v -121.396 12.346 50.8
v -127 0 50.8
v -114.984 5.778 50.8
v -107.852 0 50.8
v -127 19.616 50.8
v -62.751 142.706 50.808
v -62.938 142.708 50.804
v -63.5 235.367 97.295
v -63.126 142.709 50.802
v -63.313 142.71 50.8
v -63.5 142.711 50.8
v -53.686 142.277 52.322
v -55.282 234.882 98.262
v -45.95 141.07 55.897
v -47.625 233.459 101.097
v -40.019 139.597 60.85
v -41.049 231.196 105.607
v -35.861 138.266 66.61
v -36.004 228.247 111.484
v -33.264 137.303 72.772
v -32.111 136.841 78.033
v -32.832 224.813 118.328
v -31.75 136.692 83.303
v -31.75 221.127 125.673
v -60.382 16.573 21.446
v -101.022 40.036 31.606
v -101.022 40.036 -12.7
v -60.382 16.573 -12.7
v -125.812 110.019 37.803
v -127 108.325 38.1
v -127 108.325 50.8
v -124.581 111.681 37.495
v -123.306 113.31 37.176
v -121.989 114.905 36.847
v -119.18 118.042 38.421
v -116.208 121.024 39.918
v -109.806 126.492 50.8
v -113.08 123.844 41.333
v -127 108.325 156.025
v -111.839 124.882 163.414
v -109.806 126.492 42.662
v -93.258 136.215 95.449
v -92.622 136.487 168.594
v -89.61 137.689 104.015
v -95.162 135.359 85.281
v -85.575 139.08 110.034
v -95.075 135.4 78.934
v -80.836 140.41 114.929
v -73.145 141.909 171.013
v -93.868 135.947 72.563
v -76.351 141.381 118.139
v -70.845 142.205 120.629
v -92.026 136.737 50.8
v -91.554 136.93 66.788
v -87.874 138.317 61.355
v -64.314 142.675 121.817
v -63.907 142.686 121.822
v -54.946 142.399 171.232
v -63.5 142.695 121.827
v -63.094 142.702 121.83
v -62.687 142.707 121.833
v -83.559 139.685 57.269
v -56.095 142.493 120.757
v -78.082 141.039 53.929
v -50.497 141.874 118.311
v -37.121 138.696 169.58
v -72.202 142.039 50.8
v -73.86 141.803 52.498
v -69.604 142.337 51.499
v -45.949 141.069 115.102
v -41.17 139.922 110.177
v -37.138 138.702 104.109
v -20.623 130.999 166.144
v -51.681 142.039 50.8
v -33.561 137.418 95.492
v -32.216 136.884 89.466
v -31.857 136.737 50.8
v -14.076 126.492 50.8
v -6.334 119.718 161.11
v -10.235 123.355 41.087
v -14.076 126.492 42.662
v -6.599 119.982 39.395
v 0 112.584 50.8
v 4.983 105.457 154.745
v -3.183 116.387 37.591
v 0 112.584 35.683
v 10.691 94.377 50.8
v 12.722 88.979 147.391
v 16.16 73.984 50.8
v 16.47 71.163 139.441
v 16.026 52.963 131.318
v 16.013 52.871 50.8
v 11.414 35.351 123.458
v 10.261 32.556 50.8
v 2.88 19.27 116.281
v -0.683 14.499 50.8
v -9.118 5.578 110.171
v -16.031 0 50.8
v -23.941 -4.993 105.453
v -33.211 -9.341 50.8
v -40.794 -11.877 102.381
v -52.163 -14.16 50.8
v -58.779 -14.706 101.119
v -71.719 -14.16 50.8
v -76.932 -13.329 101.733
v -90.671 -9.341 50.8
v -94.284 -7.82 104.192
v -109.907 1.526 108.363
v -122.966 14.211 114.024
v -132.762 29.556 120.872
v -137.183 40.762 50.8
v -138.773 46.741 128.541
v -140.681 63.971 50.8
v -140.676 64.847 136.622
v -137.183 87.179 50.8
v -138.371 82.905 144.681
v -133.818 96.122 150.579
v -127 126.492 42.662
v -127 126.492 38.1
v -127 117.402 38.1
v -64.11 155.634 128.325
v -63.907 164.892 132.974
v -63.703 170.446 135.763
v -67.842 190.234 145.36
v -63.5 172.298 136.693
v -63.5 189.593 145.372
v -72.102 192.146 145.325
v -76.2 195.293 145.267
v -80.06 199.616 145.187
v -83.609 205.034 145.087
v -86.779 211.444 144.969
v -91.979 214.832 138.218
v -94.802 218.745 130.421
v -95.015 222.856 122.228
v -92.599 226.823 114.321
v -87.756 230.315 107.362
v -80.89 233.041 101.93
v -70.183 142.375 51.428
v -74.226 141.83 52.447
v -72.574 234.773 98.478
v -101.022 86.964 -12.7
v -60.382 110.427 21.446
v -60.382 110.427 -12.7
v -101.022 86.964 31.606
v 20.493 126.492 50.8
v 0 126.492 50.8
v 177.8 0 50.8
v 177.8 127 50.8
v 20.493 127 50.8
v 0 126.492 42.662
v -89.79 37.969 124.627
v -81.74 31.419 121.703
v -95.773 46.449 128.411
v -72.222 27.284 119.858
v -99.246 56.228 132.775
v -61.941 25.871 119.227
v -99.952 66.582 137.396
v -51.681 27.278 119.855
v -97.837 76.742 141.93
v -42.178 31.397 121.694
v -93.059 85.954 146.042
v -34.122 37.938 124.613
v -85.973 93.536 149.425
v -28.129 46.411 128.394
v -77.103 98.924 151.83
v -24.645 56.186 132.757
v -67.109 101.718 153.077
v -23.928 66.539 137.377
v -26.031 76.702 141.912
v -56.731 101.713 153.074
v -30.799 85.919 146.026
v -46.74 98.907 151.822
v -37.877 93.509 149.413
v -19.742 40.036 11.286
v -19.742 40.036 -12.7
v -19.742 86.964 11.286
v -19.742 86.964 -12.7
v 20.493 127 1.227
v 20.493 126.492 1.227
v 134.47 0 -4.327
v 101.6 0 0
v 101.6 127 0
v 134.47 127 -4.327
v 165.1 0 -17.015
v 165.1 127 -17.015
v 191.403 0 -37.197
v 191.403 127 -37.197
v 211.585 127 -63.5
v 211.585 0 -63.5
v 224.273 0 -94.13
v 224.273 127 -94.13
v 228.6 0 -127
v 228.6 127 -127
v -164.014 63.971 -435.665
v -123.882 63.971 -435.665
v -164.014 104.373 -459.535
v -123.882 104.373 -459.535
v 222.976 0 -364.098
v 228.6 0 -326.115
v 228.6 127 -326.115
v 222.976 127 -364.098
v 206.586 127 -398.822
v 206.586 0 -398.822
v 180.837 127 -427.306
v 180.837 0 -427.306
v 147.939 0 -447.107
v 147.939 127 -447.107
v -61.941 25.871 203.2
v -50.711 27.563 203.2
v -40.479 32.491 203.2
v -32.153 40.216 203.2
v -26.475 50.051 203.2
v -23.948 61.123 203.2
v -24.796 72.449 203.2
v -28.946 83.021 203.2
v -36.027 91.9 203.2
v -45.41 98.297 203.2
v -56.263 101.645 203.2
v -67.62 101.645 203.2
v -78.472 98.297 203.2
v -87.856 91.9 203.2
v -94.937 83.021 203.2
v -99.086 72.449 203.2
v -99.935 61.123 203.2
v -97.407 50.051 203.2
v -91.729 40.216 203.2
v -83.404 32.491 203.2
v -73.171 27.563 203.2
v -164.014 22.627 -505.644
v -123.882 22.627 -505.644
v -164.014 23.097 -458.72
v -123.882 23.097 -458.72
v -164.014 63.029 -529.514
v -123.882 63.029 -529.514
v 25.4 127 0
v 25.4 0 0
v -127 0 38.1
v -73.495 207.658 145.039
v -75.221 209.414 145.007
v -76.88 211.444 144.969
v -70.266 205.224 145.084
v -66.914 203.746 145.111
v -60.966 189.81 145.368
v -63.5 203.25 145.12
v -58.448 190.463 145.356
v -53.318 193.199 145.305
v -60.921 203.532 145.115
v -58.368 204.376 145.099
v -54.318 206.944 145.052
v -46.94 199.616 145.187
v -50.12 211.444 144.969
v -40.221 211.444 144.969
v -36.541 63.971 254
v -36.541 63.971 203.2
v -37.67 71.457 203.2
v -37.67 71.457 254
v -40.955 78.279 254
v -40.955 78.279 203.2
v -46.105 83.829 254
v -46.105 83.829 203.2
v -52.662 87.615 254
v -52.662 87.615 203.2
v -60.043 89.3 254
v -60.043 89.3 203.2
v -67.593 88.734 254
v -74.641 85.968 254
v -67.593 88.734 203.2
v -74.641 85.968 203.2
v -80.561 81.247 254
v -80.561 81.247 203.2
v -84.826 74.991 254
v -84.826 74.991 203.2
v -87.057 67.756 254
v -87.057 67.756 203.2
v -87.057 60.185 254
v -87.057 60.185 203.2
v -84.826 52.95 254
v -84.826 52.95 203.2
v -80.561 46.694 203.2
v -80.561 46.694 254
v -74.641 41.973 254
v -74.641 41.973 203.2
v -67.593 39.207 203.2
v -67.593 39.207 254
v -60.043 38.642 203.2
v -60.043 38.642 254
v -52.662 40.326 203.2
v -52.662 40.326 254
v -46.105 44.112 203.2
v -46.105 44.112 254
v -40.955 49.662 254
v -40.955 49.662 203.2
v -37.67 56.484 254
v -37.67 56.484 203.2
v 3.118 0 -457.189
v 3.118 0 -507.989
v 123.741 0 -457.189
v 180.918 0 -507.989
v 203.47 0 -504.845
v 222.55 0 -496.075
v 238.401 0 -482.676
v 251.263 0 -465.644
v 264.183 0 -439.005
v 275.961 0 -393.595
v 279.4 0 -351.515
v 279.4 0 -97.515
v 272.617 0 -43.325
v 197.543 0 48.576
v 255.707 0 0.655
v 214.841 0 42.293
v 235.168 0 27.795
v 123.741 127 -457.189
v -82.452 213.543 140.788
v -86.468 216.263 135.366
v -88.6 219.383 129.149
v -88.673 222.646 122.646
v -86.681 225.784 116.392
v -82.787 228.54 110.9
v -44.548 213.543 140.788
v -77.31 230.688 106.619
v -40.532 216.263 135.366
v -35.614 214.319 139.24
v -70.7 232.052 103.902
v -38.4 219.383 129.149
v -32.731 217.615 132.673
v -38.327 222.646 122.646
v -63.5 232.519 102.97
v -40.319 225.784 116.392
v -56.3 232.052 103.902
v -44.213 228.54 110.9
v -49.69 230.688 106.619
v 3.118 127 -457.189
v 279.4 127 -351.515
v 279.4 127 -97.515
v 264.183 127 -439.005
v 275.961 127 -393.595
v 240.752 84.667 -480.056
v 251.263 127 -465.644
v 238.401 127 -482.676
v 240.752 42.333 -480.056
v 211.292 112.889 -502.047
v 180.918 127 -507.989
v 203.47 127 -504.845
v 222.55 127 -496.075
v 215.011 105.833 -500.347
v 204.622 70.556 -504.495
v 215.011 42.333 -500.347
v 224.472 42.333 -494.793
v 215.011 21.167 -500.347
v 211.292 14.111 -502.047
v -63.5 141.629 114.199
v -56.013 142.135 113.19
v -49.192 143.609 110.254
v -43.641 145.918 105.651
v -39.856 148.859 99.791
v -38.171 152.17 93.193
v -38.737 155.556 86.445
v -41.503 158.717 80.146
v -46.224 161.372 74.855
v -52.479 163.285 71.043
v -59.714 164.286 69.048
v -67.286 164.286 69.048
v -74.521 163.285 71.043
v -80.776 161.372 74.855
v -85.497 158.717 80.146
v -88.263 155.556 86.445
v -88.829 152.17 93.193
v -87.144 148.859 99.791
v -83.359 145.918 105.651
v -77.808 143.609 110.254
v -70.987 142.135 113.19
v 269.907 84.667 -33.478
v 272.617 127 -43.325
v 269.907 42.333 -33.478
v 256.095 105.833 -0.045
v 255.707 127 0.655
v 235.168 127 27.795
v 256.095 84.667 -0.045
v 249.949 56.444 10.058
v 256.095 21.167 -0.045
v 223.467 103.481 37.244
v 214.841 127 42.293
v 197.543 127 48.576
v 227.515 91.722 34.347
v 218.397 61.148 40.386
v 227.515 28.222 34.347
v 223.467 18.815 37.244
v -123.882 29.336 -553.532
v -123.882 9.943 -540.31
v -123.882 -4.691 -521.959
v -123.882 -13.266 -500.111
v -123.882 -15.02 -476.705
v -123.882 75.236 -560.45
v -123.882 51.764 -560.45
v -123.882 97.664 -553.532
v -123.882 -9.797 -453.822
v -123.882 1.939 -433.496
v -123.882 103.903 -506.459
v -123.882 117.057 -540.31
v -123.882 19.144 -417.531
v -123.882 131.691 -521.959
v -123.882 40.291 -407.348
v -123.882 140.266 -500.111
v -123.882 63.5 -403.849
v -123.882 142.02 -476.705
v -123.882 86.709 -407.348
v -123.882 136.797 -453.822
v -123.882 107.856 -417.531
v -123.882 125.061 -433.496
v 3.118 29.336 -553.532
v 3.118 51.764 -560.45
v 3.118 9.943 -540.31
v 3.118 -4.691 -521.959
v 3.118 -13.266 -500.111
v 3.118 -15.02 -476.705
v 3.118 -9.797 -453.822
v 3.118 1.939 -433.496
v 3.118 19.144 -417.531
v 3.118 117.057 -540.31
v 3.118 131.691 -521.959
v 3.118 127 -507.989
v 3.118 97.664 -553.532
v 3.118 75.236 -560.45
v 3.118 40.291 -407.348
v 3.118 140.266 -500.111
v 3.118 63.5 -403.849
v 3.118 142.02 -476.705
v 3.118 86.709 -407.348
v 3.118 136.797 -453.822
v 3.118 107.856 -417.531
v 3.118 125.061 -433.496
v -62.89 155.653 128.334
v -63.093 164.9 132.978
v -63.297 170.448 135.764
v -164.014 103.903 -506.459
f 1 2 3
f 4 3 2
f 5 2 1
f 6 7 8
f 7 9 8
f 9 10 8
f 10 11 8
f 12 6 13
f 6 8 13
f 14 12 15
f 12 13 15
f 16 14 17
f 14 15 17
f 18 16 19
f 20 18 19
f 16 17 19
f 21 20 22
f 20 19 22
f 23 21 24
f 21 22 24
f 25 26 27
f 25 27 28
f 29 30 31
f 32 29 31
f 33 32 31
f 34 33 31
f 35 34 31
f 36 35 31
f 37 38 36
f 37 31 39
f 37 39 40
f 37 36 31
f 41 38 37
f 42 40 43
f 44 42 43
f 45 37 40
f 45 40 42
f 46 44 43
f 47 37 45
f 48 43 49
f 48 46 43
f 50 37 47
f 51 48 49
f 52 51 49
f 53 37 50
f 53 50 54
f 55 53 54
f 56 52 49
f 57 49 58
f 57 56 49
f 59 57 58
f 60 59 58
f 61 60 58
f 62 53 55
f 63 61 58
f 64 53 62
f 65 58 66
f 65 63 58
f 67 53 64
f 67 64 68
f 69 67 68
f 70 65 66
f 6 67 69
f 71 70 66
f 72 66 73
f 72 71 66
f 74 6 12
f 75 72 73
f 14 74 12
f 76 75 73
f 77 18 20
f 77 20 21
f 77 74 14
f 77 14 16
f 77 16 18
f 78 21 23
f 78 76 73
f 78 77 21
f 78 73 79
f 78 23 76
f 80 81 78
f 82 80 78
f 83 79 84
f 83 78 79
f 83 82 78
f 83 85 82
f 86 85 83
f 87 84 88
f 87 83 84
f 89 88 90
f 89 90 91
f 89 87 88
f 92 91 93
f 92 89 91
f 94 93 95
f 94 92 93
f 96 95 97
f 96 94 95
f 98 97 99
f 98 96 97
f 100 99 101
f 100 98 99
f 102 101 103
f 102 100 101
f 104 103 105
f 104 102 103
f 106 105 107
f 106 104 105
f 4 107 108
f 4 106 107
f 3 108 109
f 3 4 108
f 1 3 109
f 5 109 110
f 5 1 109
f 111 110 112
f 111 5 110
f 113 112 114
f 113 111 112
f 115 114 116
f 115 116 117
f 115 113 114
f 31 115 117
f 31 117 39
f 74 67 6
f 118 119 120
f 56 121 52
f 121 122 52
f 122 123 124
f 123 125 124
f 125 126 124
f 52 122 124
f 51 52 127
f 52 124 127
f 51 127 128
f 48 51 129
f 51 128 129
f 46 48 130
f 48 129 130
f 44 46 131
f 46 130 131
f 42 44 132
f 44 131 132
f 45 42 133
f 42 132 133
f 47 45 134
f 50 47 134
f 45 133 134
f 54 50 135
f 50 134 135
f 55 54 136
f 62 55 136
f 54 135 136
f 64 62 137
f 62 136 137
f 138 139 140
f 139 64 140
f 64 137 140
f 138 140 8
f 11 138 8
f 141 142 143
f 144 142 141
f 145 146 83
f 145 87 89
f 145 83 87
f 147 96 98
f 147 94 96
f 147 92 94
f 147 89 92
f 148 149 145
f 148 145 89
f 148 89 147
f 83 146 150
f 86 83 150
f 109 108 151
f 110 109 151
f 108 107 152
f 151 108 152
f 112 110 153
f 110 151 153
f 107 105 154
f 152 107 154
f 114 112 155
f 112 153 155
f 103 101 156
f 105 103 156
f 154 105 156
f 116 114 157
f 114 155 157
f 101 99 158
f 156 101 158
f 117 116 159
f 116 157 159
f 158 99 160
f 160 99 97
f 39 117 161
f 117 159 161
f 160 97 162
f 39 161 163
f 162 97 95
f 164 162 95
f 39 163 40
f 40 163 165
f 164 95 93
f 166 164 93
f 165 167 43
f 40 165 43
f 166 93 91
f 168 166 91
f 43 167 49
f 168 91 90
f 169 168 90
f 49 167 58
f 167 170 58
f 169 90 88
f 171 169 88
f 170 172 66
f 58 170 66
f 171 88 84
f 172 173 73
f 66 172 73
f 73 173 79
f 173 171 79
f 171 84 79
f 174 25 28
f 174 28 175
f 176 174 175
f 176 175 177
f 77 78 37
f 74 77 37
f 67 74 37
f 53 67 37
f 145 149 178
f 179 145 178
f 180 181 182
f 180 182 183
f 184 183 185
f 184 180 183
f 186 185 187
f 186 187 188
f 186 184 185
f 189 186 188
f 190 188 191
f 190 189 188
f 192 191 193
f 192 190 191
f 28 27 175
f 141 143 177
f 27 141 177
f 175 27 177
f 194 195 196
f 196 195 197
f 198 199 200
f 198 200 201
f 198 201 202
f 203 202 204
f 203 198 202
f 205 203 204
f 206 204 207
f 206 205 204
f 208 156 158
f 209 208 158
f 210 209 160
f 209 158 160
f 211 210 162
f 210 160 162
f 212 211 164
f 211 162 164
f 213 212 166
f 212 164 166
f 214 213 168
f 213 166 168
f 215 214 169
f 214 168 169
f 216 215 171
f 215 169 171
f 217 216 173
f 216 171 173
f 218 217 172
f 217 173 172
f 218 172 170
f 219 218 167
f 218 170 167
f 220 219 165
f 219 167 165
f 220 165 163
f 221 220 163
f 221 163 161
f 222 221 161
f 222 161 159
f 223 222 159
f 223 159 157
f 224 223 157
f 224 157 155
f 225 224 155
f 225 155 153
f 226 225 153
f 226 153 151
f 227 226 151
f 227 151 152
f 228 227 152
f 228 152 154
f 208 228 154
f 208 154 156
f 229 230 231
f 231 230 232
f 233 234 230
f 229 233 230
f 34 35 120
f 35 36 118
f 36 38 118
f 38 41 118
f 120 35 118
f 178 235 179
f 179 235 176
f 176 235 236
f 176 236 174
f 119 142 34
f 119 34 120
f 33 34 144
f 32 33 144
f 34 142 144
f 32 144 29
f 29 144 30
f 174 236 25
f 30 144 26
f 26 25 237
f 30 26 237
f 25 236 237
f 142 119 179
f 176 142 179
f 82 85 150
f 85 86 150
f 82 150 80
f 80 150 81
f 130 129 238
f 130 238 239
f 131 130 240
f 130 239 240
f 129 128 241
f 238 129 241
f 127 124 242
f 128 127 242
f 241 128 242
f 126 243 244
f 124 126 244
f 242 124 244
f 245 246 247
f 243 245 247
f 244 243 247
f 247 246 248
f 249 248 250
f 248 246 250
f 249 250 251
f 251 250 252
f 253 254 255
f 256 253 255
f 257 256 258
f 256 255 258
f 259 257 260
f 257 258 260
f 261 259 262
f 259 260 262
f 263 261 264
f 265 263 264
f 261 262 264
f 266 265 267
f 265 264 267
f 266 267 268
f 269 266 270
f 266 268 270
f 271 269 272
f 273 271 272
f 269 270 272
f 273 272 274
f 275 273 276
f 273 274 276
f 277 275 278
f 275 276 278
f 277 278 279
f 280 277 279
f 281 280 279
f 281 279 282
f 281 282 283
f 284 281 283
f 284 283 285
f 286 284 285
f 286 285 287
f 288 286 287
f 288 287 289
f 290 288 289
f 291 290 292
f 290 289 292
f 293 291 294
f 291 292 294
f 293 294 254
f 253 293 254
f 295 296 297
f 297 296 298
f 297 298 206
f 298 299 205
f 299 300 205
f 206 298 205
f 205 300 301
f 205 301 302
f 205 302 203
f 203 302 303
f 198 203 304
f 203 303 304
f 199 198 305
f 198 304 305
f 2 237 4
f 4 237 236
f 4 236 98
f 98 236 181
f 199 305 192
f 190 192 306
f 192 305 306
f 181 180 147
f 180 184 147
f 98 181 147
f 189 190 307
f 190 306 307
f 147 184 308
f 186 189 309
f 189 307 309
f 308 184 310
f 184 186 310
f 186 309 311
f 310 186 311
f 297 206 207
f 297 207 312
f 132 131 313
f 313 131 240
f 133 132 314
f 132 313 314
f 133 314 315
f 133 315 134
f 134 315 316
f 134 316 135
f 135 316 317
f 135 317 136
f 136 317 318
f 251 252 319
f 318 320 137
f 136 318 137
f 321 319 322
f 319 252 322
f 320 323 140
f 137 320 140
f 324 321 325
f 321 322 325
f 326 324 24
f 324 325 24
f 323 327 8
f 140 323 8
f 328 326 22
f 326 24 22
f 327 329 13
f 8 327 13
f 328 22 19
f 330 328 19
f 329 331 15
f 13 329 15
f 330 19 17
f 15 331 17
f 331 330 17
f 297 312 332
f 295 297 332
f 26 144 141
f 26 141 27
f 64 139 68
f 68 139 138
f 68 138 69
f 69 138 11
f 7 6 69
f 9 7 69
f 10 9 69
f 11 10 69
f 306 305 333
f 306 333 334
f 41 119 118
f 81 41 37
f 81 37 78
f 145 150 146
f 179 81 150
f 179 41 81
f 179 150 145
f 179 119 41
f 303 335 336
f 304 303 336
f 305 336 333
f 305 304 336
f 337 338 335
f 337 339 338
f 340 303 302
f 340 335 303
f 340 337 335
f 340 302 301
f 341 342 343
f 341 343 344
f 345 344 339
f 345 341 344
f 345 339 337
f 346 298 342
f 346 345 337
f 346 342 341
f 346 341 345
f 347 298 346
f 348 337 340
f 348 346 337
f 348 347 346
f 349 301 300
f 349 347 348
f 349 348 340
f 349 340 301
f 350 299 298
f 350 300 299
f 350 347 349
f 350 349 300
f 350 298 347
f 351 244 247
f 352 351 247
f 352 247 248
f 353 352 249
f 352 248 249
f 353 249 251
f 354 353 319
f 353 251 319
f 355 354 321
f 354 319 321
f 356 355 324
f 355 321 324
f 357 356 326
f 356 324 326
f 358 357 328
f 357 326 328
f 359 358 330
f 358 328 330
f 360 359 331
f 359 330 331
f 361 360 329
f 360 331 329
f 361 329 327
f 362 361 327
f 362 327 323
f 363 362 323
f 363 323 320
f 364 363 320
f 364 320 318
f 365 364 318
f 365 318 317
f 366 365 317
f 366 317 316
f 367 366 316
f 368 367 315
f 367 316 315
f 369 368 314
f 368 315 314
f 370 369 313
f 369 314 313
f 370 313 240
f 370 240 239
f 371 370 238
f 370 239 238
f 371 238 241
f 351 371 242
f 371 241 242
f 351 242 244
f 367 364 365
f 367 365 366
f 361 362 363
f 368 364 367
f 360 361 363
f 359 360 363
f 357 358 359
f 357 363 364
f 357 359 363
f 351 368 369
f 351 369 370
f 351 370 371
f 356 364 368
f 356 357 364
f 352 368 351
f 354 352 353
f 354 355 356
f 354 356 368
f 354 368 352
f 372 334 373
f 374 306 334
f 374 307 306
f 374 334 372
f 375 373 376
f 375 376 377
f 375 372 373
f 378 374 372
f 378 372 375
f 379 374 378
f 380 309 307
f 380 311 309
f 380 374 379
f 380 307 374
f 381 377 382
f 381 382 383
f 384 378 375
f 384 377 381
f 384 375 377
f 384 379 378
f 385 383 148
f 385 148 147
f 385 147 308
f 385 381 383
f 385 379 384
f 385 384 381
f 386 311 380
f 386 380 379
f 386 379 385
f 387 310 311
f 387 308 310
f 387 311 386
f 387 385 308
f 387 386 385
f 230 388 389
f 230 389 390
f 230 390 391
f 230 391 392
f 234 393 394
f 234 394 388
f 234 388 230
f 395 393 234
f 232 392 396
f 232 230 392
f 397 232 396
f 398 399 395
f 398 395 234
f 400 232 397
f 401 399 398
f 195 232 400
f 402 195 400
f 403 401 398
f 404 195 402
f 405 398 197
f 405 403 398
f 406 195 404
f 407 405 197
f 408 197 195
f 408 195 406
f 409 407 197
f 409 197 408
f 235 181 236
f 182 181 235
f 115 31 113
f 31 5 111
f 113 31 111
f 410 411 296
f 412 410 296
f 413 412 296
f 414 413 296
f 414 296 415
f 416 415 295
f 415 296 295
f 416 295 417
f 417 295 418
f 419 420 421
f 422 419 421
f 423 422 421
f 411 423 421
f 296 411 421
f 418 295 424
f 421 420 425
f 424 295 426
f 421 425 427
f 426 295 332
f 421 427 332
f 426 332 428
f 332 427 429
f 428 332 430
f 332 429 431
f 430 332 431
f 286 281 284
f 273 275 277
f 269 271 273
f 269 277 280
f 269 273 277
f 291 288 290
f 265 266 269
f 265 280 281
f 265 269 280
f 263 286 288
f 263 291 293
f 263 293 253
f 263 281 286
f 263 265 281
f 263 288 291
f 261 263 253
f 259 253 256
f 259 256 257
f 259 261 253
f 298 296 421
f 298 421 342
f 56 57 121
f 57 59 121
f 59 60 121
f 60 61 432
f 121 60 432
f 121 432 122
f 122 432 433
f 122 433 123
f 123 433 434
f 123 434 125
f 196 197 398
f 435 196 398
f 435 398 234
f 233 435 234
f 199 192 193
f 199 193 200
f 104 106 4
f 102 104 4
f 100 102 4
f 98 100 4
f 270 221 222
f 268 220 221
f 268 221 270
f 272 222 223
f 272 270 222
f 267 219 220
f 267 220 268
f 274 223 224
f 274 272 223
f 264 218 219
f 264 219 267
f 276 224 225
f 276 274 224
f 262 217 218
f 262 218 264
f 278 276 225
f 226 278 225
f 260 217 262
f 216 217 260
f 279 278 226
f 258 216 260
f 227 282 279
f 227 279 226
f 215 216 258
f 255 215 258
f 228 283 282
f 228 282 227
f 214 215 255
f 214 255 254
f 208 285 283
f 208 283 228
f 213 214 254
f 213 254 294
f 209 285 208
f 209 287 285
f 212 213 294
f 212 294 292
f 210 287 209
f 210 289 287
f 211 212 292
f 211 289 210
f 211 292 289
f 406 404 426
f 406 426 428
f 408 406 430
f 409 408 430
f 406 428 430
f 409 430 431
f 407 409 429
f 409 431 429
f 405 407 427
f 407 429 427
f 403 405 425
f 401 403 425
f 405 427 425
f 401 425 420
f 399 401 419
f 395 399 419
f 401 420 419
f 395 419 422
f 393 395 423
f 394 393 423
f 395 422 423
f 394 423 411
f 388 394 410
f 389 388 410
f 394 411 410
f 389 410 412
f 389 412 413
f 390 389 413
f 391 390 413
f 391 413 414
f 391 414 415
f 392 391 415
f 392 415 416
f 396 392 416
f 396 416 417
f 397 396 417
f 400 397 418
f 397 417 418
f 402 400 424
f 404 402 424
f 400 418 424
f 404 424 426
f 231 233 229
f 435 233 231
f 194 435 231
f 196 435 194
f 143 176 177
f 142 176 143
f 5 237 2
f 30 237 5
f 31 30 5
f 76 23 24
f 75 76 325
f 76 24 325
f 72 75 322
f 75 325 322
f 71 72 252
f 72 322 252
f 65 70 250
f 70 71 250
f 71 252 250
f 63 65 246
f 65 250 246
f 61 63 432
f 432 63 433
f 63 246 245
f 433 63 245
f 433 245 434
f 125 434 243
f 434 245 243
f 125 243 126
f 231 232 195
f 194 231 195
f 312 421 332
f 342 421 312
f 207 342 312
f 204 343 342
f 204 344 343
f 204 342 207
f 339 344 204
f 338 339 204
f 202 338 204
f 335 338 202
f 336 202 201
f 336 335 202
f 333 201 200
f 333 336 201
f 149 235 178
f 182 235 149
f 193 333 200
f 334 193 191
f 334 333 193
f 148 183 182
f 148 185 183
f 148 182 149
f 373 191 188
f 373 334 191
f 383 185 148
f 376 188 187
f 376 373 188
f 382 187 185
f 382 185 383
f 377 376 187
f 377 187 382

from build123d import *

# Parameters (mm, degrees)
BOSS_EXTRUDE1_DEPTH             = 127
SKETCH2_R                       = 78.74
BOSS_EXTRUDE2_DEPTH             = 127
BOSS_EXTRUDE3_DEPTH             = 40.132
SKETCH4_W                       = 50.8
SKETCH4_H                       = 127
BOSS_EXTRUDE4_DEPTH             = 127
CUT_EXTRUDE1_DEPTH              = 643.951973118
BOSS_EXTRUDE6_DEPTH             = 63.5
BOSS_EXTRUDE7_DEPTH             = 0.254
SKETCH10_R                      = 78.74
BOSS_EXTRUDE8_DEPTH             = 127
CUT_EXTRUDE4_DEPTH              = 1270
SKETCH12_R                      = 38.1
BOSS_EXTRUDE9_DEPTH             = 152.4
SKETCH13_R                      = 25.4
BOSS_EXTRUDE10_DEPTH            = 50.8
BOSS_EXTRUDE11_DEPTH            = 127
CUT_EXTRUDE11_REACH             = 771.882
CUT_EXTRUDE11_END_RADIUS        = 78.74
CUT_EXTRUDE11_DIRECTION_2_DEPTH = 770.882300623
SKETCH22_R                      = 25.4
CUT_EXTRUDE12_DEPTH             = 76.2
CUT_EXTRUDE13_DEPTH             = 670.740807287
CUT_EXTRUDE16_DEPTH             = 0.508


with BuildPart() as part:
    # Sketch1 → Boss-Extrude1 (new body)
    with BuildSketch(Plane(origin=(0, 0, 0), x_dir=(1, 0, 0), z_dir=(0, 1, 0))):
        with BuildLine():
            Line((0, 0), (76.2, 0))
            Line((76.2, 0), (101.6, 0))
            ThreePointArc((101.6, 0), (191.402561211, 37.197438789), (228.6, 127))
            Line((228.6, 127), (228.6, 326.115224022))
            ThreePointArc((228.6, 326.115224022), (206.586135695, 398.822078741), (147.938986841, 447.106743761))
            Line((147.938986841, 447.106743761), (123.740682893, 457.189370406))
            Line((123.740682893, 457.189370406), (3.117633302, 457.189370406))
            Line((3.117633302, 457.189370406), (3.117633302, 507.989370406))
            Line((3.117633302, 507.989370406), (130.117633302, 507.989370406))
            Line((130.117633302, 507.989370406), (180.917633302, 507.989370406))
            add(Edge.make_bspline(
                [(180.917633302, 507.989370406), (258.096842752, 507.989370406), (279.4, 408.366132146), (279.4, 351.515224022)],
                knots=[0, 0, 0, 0, 0.284383622, 0.284383622, 0.284383622, 0.284383622], degree=3))
            Line((279.4, 351.515224022), (279.4, 97.515224022))
            add(Edge.make_bspline(
                [(279.4, 97.515224022), (279.4, 39.949501281), (253.612703292, -50.8), (177.8, -50.8)],
                knots=[0.713423735, 0.713423735, 0.713423735, 0.713423735, 1, 1, 1, 1], degree=3))
            Line((177.8, -50.8), (127, -50.8))
            Line((127, -50.8), (0, -50.8))
            Line((0, -50.8), (0, 0))
        make_face()
    extrude(amount=BOSS_EXTRUDE1_DEPTH)

    # Sketch2 → Boss-Extrude2 (add)
    with BuildSketch(Plane.ZY.offset(-3.117633302)):
        with Locations((-482.589370406, 63.5)):
            Circle(SKETCH2_R)
    extrude(amount=BOSS_EXTRUDE2_DEPTH)

    # Sketch3 → Boss-Extrude3 (add)
    with BuildSketch(Plane.ZY.offset(123.882366698)):
        Polygon((-435.664699602, 63.970535124), (-459.534530374, 104.373224542), (-506.459201178, 103.902689418), (-529.514041209, 63.029464876), (-505.644210437, 22.626775458), (-458.719539633, 23.097310582), align=None)
    extrude(amount=BOSS_EXTRUDE3_DEPTH)

    # Sketch4 → Boss-Extrude4 (add)
    with BuildSketch(Plane.ZY):
        with Locations((25.4, 63.5)):
            Rectangle(SKETCH4_W, SKETCH4_H)
    extrude(amount=BOSS_EXTRUDE4_DEPTH)

    # Sketch5 → Cut-Extrude1 (cut, through all)
    with BuildSketch(Plane(origin=(0, 0, 0), x_dir=(-1, 0, 0), z_dir=(0, -1, 0))):
        Polygon((127, -38.1), (127, 0), (-25.4, 0), align=None)
    extrude(amount=-CUT_EXTRUDE1_DEPTH, mode=Mode.SUBTRACT)

    # Sketch7 → Boss-Extrude6 (add)
    with BuildSketch(Plane.XY.offset(50.8)):
        Polygon((-60.382366698, 110.42702988), (-101.022366698, 86.96351494), (-101.022366698, 40.03648506), (-60.382366698, 16.57297012), (-19.742366698, 40.03648506), (-19.742366698, 86.96351494), align=None)
    extrude(amount=-BOSS_EXTRUDE6_DEPTH)

    # Sketch9 → Boss-Extrude7 (add)
    with BuildSketch(Plane.XY.offset(50.8)):
        Polygon((-61.941183349, 110.42702988), (-102.581183349, 86.96351494), (-102.581183349, 40.03648506), (-61.941183349, 16.57297012), (-21.301183349, 40.03648506), (-21.301183349, 86.96351494), align=None)
    extrude(amount=BOSS_EXTRUDE7_DEPTH)

    # Sketch10 → Boss-Extrude8 (add)
    with BuildSketch(Plane.XY.offset(50.8)):
        with Locations(Location((-61.941183349, 63.970535124, 0), (0, 0, 145.715287544))):
            Circle(SKETCH10_R)
    extrude(amount=BOSS_EXTRUDE8_DEPTH)

    # Sketch11 → Cut-Extrude4 (cut, symmetric)
    with BuildSketch(Plane(origin=(-139.7, 0, 0), x_dir=(0, 0, -1), z_dir=(1, 0, 0))):
        Polygon((-99.545745502, -18.230355882), (-194.983113001, 195.61885318), (-201.145745502, 206.905410628), (-201.145745502, -18.230355882), align=None)
    extrude(amount=CUT_EXTRUDE4_DEPTH, both=True, mode=Mode.SUBTRACT)

    # Sketch12 → Boss-Extrude9 (add)
    with BuildSketch(Plane.XY.offset(50.8)):
        with Locations(Location((-61.941183349, 63.970535124, 0), (0, 0, 270))):
            Circle(SKETCH12_R)
    extrude(amount=BOSS_EXTRUDE9_DEPTH)

    # Sketch13 → Boss-Extrude10 (add)
    with BuildSketch(Plane.XY.offset(203.2)):
        with Locations((-61.941183349, 63.970535124)):
            Circle(SKETCH13_R)
    extrude(amount=BOSS_EXTRUDE10_DEPTH)

    # Sketch18 → Boss-Extrude11 (add)
    with BuildSketch(Plane(origin=(0, 0, 0), x_dir=(0, 0, -1), z_dir=(1, 0, 0))):
        Polygon((-97.294911039, 235.367216838), (-50.8, 142.710535124), (-106.805146459, 112.782729155), (-136.693024963, 172.297640285), (-154.050167135, 206.887559091), align=None)
    extrude(amount=-BOSS_EXTRUDE11_DEPTH)

    # Cut-Extrude11: up to this cylinder (the profile starts outside it)
    cut_extrude11_end = Plane(origin=(-61.941183349, 63.970535124, 125.672539), z_dir=(0, 0, -1)) * Cylinder(CUT_EXTRUDE11_END_RADIUS, 1702.244, mode=Mode.PRIVATE)
    # Sketch21 → Cut-Extrude11 (cut, up to the surface)
    with BuildSketch(Plane(origin=(0, 227.024577499, 113.920413931), x_dir=(1, 0, 0), z_dir=(0, 0.8937835605799322, 0.44849854719615173)), mode=Mode.PRIVATE) as cut_extrude11_sk1:
        with BuildLine():
            Line((-63.5, -44.898737205), (0, -44.898737205))
            Line((0, -44.898737205), (0, 18.601262795))
            Line((0, 18.601262795), (-63.5, 18.601262795))
            ThreePointArc((-63.5, 18.601262795), (-41.049359697, 9.301903098), (-31.75, -13.148737205))
            ThreePointArc((-31.75, -13.148737205), (-41.049359697, -35.599377508), (-63.5, -44.898737205))
        make_face()
    cut_extrude11_tool1 = extrude(cut_extrude11_sk1.sketch, amount=-CUT_EXTRUDE11_REACH, mode=Mode.PRIVATE) - cut_extrude11_end
    add(cut_extrude11_tool1.solids().sort_by_distance((-19.932911, 221.127388, 125.672539))[0], mode=Mode.SUBTRACT)
    # Sketch21 → Cut-Extrude11 (cut, up to the surface)
    with BuildSketch(Plane(origin=(0, 227.024577499, 113.920413931), x_dir=(1, 0, 0), z_dir=(0, 0.8937835605799322, 0.44849854719615173)), mode=Mode.PRIVATE) as cut_extrude11_sk2:
        with BuildLine():
            Line((-127, -44.898737205), (-63.5, -44.898737205))
            ThreePointArc((-63.5, -44.898737205), (-95.25, -13.148737205), (-63.5, 18.601262795))
            Line((-63.5, 18.601262795), (-127, 18.601262795))
            Line((-127, 18.601262795), (-127, -44.898737205))
        make_face()
    cut_extrude11_tool2 = extrude(cut_extrude11_sk2.sketch, amount=-CUT_EXTRUDE11_REACH, mode=Mode.PRIVATE) - cut_extrude11_end
    add(cut_extrude11_tool2.solids().sort_by_distance((-107.067089, 221.127388, 125.672539))[0], mode=Mode.SUBTRACT)

    # Sketch21 → Cut-Extrude11 direction 2 (cut)
    with BuildSketch(Plane(origin=(0, 227.024577499, 113.920413931), x_dir=(1, 0, 0), z_dir=(0, 0.8937835605799322, 0.44849854719615173))):
        with BuildLine():
            Line((-63.5, -44.898737205), (0, -44.898737205))
            Line((0, -44.898737205), (0, 18.601262795))
            Line((0, 18.601262795), (-63.5, 18.601262795))
            ThreePointArc((-63.5, 18.601262795), (-41.049359697, 9.301903098), (-31.75, -13.148737205))
            ThreePointArc((-31.75, -13.148737205), (-41.049359697, -35.599377508), (-63.5, -44.898737205))
        make_face()
        with BuildLine():
            Line((-127, -44.898737205), (-63.5, -44.898737205))
            ThreePointArc((-63.5, -44.898737205), (-95.25, -13.148737205), (-63.5, 18.601262795))
            Line((-63.5, 18.601262795), (-127, 18.601262795))
            Line((-127, 18.601262795), (-127, -44.898737205))
        make_face()
    extrude(amount=CUT_EXTRUDE11_DIRECTION_2_DEPTH, mode=Mode.SUBTRACT)

    # Sketch22 → Cut-Extrude12 (cut)
    with BuildSketch(Plane(origin=(0, 227.024577499, 113.920413931), x_dir=(1, 0, 0), z_dir=(0, 0.8937835605799322, 0.44849854719615173))):
        with Locations(Location((-63.5, -13.148737205, 0), (0, 0, 270))):
            Circle(SKETCH22_R)
    extrude(amount=-CUT_EXTRUDE12_DEPTH, mode=Mode.SUBTRACT)

    # Sketch23 → Cut-Extrude13 (cut, through all)
    with BuildSketch(Plane(origin=(0, 0, 0), x_dir=(0, 0, -1), z_dir=(1, 0, 0))):
        Polygon((-154.050167135, 206.887559091), (-145.371596049, 189.592599687), (-144.96932616, 211.444304331), align=None)
    extrude(amount=-CUT_EXTRUDE13_DEPTH, mode=Mode.SUBTRACT)

    # Sketch24 → Cut-Extrude16 (cut)
    with BuildSketch(Plane(origin=(0, 127, 0), x_dir=(1, 0, 0), z_dir=(0, 1, 0))):
        Polygon((20.493010652, -50.8), (20.493010652, -1.226747337), (-127, -38.1), (-127, -50.8), align=None)
    extrude(amount=-CUT_EXTRUDE16_DEPTH, mode=Mode.SUBTRACT)


solid = part.part
